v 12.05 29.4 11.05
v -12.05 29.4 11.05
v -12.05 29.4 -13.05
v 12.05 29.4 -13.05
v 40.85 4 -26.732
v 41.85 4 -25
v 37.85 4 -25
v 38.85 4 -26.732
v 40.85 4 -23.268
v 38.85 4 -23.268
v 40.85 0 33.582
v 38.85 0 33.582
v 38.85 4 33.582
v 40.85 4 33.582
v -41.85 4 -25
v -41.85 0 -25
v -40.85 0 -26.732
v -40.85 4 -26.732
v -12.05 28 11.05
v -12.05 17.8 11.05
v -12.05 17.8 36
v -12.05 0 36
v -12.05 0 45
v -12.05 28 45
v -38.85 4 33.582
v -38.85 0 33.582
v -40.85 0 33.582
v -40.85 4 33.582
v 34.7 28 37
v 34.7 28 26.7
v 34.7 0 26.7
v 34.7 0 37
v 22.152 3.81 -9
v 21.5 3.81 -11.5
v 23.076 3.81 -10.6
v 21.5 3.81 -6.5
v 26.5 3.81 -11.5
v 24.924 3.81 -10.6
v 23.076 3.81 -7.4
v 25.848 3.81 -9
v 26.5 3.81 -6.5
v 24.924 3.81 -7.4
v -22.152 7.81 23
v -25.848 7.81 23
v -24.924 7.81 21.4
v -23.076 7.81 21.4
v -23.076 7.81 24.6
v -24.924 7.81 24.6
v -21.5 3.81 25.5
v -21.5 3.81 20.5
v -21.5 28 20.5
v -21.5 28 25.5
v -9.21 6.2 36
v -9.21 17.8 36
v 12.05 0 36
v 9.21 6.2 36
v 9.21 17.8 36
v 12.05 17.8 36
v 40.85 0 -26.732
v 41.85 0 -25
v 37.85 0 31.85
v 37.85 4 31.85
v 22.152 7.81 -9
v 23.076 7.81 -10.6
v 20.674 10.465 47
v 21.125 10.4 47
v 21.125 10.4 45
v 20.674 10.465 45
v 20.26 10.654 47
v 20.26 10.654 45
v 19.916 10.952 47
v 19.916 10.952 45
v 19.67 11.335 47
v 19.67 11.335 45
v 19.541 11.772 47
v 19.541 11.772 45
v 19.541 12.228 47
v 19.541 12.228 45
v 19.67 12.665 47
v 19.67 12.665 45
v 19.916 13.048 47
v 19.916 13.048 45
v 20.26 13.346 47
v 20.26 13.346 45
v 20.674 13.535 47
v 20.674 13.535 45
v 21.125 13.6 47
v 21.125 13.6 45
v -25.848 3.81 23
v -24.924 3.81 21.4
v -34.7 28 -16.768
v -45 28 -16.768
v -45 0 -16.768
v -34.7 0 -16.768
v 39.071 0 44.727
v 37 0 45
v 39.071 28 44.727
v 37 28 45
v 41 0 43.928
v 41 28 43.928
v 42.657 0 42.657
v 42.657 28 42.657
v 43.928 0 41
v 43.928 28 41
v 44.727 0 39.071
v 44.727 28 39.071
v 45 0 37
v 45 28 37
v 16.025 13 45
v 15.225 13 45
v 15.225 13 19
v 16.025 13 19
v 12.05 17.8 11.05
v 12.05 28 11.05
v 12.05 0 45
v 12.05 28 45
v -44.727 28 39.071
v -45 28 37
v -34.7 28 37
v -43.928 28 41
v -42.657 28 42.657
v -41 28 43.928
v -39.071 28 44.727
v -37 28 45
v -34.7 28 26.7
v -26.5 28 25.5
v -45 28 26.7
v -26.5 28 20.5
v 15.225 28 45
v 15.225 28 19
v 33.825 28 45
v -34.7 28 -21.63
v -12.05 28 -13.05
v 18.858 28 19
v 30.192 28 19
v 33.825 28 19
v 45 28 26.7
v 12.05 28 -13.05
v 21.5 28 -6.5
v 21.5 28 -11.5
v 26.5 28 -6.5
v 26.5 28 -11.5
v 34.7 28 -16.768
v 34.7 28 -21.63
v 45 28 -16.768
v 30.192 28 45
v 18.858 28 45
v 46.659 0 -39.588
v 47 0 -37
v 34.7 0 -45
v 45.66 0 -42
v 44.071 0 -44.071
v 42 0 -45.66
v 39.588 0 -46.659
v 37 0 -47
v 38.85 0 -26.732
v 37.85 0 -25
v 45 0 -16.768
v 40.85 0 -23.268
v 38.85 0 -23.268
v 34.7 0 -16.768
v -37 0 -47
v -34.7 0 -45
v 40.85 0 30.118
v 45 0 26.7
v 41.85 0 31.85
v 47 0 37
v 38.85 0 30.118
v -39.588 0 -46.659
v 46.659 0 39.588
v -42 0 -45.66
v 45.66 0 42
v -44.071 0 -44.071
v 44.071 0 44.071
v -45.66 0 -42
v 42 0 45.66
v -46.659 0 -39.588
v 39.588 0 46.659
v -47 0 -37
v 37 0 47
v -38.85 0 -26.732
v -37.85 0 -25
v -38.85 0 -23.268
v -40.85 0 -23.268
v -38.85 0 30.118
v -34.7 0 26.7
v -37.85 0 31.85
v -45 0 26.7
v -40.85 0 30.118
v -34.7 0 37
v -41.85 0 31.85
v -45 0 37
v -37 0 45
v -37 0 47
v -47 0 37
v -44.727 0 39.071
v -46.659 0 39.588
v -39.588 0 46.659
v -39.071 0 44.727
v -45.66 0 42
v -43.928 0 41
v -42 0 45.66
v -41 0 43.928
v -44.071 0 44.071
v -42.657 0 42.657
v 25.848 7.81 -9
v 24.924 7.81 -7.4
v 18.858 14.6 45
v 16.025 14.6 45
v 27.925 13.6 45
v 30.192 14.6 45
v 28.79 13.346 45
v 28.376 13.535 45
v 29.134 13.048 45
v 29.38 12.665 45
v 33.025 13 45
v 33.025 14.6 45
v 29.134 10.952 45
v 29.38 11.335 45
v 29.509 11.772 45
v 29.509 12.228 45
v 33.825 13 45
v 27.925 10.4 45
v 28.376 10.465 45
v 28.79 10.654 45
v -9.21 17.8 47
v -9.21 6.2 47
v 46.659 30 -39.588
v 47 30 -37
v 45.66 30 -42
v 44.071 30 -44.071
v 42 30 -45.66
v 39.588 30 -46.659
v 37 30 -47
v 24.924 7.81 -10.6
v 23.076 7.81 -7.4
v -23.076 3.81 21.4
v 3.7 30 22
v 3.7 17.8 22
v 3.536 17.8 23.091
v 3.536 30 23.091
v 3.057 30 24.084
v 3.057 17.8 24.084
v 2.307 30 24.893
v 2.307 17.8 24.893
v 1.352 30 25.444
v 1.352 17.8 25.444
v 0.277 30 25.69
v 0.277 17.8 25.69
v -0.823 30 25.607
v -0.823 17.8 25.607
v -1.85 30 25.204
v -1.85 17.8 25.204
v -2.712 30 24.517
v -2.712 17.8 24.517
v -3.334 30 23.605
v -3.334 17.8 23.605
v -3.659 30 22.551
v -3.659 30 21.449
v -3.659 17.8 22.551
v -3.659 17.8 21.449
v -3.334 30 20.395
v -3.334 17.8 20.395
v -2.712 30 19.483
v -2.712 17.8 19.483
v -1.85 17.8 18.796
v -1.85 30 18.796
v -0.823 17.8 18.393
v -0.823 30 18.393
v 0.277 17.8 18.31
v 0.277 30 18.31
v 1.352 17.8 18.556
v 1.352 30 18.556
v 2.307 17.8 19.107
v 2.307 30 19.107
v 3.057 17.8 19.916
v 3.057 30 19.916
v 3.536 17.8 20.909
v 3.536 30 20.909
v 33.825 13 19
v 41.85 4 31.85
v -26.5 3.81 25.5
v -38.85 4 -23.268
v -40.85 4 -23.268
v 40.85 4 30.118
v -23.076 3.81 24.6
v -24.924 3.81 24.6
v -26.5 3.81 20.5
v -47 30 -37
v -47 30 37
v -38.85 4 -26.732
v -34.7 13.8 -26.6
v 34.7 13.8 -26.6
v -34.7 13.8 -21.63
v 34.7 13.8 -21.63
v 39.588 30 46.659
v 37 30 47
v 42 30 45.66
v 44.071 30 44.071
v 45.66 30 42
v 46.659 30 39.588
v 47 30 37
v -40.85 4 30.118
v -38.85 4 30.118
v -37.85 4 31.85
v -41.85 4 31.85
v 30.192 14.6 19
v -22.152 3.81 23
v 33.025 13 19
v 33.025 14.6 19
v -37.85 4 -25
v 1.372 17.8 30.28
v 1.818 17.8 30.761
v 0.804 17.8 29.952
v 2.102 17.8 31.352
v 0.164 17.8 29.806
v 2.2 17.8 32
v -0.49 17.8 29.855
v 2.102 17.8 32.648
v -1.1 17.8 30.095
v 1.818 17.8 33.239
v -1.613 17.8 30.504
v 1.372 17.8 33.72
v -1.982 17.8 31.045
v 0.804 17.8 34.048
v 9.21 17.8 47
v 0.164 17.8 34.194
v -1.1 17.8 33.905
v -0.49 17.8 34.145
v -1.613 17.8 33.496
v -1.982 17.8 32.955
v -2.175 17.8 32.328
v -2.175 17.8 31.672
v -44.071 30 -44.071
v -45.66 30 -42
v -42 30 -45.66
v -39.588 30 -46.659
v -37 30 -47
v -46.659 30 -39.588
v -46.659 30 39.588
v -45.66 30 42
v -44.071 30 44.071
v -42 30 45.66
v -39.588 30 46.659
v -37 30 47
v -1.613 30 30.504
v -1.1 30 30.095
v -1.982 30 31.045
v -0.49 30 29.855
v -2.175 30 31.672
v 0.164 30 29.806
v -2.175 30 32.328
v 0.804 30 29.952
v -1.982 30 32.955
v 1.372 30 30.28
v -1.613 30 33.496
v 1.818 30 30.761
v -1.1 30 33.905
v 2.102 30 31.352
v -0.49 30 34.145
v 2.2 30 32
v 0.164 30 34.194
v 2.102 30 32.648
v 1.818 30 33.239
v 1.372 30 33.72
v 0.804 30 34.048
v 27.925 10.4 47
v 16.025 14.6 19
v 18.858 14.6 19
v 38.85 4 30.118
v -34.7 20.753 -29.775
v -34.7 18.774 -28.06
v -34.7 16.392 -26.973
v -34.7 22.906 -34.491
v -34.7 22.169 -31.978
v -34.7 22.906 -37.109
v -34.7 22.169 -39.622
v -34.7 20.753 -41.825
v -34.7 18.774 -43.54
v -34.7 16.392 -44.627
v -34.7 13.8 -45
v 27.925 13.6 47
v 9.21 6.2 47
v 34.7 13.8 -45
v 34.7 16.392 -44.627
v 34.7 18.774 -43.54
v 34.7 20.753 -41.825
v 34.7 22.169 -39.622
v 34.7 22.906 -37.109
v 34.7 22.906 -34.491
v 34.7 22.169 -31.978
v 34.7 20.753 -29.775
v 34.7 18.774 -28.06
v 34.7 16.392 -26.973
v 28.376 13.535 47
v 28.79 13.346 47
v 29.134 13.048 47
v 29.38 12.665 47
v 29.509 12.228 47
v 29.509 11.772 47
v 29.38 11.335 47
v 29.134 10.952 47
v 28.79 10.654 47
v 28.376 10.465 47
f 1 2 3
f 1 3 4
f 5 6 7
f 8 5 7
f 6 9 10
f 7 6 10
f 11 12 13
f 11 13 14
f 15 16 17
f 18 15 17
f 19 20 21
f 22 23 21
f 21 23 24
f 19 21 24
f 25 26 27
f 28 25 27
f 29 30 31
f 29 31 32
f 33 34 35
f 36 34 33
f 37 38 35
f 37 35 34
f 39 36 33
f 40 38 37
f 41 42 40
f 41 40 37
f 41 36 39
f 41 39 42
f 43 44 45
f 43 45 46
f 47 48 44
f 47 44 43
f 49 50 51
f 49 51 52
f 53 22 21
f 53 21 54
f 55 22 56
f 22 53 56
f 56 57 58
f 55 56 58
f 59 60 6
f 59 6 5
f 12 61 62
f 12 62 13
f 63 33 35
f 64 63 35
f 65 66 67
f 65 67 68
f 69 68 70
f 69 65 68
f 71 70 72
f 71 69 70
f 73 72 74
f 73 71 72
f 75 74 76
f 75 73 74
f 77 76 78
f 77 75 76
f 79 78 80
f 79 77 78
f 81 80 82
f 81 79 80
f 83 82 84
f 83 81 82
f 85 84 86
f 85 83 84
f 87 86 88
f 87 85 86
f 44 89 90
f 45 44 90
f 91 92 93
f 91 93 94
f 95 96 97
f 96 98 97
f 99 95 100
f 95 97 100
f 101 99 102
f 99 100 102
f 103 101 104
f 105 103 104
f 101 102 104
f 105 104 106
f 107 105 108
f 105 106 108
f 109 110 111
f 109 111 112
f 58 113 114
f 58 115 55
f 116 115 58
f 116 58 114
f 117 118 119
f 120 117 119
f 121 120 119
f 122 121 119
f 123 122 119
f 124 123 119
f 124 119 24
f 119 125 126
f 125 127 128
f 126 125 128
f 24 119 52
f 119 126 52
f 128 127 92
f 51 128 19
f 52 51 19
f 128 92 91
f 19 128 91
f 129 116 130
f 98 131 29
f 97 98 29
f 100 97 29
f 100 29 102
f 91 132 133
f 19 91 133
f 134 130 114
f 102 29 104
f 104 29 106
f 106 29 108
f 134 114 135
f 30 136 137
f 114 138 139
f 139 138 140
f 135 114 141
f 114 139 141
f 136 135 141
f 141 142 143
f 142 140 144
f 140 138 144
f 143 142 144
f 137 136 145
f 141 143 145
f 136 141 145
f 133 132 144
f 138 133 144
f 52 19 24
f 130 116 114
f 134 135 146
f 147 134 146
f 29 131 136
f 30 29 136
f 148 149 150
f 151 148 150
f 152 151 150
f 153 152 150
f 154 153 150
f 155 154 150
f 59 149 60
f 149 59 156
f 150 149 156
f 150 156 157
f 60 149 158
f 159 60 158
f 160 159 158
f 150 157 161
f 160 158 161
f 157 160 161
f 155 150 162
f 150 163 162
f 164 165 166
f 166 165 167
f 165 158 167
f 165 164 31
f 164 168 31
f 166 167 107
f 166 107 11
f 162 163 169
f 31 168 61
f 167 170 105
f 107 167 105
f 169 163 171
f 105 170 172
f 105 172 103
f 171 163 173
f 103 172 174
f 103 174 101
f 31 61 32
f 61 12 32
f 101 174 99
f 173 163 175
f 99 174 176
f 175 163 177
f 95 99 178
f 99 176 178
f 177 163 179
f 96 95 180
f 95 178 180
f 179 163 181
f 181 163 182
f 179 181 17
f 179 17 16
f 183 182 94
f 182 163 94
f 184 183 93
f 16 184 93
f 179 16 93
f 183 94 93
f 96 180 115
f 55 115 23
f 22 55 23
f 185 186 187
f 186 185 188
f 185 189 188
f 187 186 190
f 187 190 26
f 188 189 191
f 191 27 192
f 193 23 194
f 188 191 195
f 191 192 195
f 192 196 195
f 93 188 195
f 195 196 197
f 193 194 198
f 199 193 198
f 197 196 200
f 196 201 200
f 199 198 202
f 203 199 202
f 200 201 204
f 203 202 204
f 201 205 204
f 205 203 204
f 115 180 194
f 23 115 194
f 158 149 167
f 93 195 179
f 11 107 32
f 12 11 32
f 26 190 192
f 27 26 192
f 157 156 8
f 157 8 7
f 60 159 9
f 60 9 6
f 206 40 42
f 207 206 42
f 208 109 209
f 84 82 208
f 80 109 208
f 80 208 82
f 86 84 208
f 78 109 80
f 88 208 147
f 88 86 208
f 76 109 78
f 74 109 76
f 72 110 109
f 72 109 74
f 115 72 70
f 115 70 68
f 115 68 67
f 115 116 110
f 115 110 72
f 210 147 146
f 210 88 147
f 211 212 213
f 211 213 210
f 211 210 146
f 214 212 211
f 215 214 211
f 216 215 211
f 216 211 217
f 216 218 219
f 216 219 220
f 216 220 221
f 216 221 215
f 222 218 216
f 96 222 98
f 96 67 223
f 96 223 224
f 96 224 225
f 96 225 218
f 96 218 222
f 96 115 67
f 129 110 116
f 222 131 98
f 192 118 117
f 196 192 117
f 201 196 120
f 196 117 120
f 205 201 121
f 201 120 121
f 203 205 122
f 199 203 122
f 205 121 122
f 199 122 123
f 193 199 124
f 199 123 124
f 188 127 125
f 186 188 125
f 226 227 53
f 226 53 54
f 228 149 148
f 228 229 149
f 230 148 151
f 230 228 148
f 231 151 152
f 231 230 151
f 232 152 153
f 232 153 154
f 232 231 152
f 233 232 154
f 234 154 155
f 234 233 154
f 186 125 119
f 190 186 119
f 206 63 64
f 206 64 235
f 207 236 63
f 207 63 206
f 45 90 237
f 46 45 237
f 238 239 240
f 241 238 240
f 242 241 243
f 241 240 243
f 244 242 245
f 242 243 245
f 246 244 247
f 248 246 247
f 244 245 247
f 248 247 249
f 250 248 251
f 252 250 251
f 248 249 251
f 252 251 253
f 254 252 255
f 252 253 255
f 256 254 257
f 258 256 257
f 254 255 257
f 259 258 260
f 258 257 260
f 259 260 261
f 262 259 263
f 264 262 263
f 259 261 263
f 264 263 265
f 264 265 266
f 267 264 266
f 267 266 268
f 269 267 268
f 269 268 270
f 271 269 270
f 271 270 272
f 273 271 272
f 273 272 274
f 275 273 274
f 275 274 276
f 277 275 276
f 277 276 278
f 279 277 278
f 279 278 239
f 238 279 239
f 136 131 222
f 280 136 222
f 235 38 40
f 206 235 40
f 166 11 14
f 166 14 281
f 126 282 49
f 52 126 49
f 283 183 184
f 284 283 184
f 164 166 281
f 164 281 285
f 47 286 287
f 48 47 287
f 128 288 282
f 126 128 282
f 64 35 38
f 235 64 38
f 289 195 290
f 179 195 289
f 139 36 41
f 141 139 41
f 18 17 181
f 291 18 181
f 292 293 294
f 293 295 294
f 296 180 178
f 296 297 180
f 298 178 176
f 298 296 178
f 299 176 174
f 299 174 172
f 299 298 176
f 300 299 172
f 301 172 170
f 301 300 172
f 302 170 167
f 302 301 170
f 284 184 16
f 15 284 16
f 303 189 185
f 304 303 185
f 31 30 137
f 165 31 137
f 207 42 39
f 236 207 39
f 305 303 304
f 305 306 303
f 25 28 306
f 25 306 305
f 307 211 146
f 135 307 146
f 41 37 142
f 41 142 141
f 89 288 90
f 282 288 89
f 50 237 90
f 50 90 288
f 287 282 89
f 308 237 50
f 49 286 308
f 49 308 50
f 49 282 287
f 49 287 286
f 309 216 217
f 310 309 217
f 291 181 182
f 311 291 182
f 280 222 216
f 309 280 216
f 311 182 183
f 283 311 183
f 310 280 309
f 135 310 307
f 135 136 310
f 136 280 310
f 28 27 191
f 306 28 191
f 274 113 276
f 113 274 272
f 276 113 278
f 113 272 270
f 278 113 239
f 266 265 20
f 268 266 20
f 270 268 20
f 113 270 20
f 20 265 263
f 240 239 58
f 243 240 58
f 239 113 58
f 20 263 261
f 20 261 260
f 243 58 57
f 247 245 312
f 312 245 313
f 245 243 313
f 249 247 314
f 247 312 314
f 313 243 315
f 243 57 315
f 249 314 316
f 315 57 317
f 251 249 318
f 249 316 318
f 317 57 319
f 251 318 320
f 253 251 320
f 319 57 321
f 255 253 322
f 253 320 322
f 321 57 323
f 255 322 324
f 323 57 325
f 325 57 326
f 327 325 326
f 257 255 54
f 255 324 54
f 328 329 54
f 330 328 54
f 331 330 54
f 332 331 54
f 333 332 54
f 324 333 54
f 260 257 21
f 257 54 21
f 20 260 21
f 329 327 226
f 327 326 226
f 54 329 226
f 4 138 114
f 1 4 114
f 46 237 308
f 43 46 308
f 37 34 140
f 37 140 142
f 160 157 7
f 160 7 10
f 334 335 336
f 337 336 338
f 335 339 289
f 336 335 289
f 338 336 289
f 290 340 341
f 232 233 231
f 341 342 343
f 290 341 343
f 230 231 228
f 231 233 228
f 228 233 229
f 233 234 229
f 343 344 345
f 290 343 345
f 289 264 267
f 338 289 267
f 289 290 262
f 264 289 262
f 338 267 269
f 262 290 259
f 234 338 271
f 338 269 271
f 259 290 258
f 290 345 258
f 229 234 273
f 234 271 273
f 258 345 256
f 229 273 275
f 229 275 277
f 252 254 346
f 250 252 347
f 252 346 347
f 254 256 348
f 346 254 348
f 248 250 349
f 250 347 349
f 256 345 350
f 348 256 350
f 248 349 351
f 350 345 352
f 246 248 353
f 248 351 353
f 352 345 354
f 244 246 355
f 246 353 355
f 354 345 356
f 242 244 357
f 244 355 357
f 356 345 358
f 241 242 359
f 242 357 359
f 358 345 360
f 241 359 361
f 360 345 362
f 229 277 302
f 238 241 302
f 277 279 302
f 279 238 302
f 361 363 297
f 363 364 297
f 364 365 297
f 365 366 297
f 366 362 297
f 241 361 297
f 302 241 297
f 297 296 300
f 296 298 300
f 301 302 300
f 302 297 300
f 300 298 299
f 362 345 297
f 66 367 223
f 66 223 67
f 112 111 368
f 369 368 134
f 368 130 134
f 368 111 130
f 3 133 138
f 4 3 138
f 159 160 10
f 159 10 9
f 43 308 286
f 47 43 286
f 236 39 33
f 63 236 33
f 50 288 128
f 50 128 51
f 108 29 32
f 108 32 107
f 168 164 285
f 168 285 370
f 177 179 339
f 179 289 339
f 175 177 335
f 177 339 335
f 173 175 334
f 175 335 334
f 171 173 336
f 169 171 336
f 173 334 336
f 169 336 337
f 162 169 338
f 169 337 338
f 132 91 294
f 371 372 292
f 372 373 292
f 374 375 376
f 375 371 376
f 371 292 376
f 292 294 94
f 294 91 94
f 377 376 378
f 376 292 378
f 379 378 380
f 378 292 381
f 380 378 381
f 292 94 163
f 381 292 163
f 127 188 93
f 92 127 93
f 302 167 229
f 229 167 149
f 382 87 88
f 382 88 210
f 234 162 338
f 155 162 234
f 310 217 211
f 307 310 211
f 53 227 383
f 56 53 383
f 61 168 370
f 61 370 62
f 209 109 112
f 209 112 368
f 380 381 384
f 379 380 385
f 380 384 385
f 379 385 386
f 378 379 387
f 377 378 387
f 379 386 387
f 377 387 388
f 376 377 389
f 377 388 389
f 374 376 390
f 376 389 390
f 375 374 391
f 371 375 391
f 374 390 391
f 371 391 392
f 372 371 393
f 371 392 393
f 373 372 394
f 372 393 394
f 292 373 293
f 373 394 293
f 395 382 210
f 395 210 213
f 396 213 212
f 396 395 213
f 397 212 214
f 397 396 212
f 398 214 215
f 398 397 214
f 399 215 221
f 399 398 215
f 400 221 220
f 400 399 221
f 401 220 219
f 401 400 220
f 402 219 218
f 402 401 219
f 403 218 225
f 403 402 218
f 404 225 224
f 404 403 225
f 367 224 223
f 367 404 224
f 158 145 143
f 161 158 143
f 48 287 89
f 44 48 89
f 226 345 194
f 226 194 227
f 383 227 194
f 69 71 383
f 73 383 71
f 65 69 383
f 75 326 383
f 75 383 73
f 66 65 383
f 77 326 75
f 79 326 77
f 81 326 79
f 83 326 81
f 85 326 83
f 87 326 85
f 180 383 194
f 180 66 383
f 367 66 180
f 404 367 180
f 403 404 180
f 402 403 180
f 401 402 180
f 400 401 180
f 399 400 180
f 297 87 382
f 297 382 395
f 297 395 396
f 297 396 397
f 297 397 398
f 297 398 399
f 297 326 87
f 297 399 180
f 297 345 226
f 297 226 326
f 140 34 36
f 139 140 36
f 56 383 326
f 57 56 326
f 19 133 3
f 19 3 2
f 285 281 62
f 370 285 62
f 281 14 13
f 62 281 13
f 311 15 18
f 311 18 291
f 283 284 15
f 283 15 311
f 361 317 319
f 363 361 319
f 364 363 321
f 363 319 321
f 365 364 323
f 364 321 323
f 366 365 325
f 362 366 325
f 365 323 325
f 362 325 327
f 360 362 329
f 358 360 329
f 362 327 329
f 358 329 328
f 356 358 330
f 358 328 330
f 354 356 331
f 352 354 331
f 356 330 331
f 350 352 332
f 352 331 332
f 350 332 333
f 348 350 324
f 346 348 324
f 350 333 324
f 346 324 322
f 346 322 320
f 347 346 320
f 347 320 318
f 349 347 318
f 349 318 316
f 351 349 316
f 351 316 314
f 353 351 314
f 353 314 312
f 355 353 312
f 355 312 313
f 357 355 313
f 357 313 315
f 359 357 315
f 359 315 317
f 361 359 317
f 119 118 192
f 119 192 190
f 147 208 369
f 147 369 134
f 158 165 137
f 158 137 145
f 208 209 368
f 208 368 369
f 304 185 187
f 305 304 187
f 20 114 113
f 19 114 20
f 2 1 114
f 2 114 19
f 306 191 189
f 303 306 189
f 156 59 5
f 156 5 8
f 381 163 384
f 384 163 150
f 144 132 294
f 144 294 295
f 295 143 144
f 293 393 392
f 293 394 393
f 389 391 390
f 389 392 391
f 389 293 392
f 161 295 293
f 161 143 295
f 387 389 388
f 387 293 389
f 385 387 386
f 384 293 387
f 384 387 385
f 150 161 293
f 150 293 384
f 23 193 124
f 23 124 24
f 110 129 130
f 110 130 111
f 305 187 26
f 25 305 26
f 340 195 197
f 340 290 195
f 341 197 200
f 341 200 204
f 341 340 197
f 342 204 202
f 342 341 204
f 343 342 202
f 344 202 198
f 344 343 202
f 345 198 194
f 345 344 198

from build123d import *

# Parameters (mm, degrees)
SKETCH_1_W             = 94
SKETCH_1_H             = 94
EXTRUDE_1_DEPTH        = 30
FILLET_1_R             = 10
SHELL_1_T              = -2
SKETCH_2_W             = 24.1
SKETCH_2_H             = 30
EXTRUDE_3392_DEPTH     = 11
CUT_EXTRUDE_3513_REACH = 111.293
SKETCH_3_W             = 18.42
SKETCH_3_H             = 11.6
SKETCH_4_W             = 24.1
SKETCH_4_H             = 24.1
CUT_EXTRUDE_3826_DEPTH = 1.4
EXTRUDE_4548_DEPTH     = 14.2
SKETCH_9_W             = 69.4
SKETCH_9_H             = 9.2
SKETCH_10_W            = 5
SKETCH_10_H            = 5
EXTRUDE_5202_DEPTH     = 24.19
CUT_EXTRUDE_5310_DEPTH = 4
USBC_REACH             = 111.293
USBC_2_DEPTH           = 26
SKETCH_22_W            = 24.1
SKETCH_22_H            = 10.2
EXTRUDE_7617_DEPTH     = 24.95
CUT_EXTRUDE_6_REACH    = 70.81
SKETCH_23_R            = 2.2
SKETCH_23_R_2          = 3.7
SKETCH_13_W            = 10.3
SKETCH_13_H            = 10.3
EXTRUDE_4_DEPTH        = 28
CUT_EXTRUDE_7_DEPTH    = 4


with BuildPart() as part:
    # 草图1 → 凸台-拉伸1 (new body)
    with BuildSketch(Plane(origin=(0, 0, 0), x_dir=(1, 0, 0), z_dir=(0, 1, 0))):
        Rectangle(SKETCH_1_W, SKETCH_1_H)
    extrude(amount=EXTRUDE_1_DEPTH)

    # 圆角1
    fillet_1_edges = [part.edges().sort_by_distance(p)[0] for p in [
        (-47, 15, -47),
        (47, 15, -47),
        (47, 15, 47),
        (-47, 15, 47),
    ]]
    fillet(fillet_1_edges, radius=FILLET_1_R)

    # 抽壳1
    shell_1_openings = [part.faces().sort_by_distance(p)[0] for p in [
        (0, 0, 0),
    ]]
    offset(amount=SHELL_1_T, openings=shell_1_openings, kind=Kind.INTERSECTION)

    # 草图2 → Extrude 3392 (add)
    with BuildSketch(Plane.XY.offset(47)):
        with Locations((0, 15)):
            Rectangle(SKETCH_2_W, SKETCH_2_H)
    extrude(amount=-EXTRUDE_3392_DEPTH)

    # 草图3 → Cut-Extrude 3513 (cut, up to next)
    with BuildSketch(Plane.XY.offset(47), mode=Mode.PRIVATE) as cut_extrude_3513_sk1:
        with Locations((0, 12)):
            Rectangle(SKETCH_3_W, SKETCH_3_H)
    cut_extrude_3513_tool1 = extrude(cut_extrude_3513_sk1.sketch, amount=-CUT_EXTRUDE_3513_REACH, mode=Mode.PRIVATE) & part.part
    add(cut_extrude_3513_tool1.solids().sort_by_distance((0, 12, 47))[0], mode=Mode.SUBTRACT)

    # 草图4 → Cut-Extrude 3826 (cut)
    with BuildSketch(Plane.XZ.offset(-28)):
        with Locations((0, -1)):
            Rectangle(SKETCH_4_W, SKETCH_4_H)
    extrude(amount=-CUT_EXTRUDE_3826_DEPTH, mode=Mode.SUBTRACT)

    # 草图6 → Extrude 4548 (add)
    with BuildSketch(Plane.XZ.offset(-28)):
        with BuildLine():
            Line((-45, -37), (-45, -21.630094022))
            Line((-45, -21.630094022), (45, -21.630094022))
            Line((45, -21.630094022), (45, -37))
            ThreePointArc((45, -37), (42.656854249, -42.656854249), (37, -45))
            Line((37, -45), (-37, -45))
            ThreePointArc((-37, -45), (-42.656854249, -42.656854249), (-45, -37))
        make_face()
    extrude(amount=EXTRUDE_4548_DEPTH)

    # 草图9 → Cut-Revolve 4776 (revolve, cut)
    with BuildSketch(Plane.XZ.offset(-13.8)):
        with Locations((0, -31.2)):
            Rectangle(SKETCH_9_W, SKETCH_9_H)
    revolve(axis=Axis((-34.7, 13.8, -35.8), (1, 0, 0)), mode=Mode.SUBTRACT)

    # 草图10 → Extrude 5202 (add)
    with BuildSketch(Plane.XZ.offset(-28)):
        with Locations((-24, 23)):
            Rectangle(SKETCH_10_W, SKETCH_10_H)
        with Locations((24, -9)):
            Rectangle(SKETCH_10_W, SKETCH_10_H)
    extrude(amount=EXTRUDE_5202_DEPTH)

    # 草图11 → Cut-Extrude 5310 (cut)
    with BuildSketch(Plane.XZ.offset(-3.81)):
        Polygon((-23.076239569, 21.4), (-22.152479139, 23), (-23.076239569, 24.6), (-24.923760431, 24.6), (-25.847520861, 23), (-24.923760431, 21.4), align=None)
        Polygon((24.923760431, -10.6), (25.847520861, -9), (24.923760431, -7.4), (23.076239569, -7.4), (22.152479139, -9), (23.076239569, -10.6), align=None)
    extrude(amount=-CUT_EXTRUDE_5310_DEPTH, mode=Mode.SUBTRACT)

    # 草图15 → USBC (cut, up to next)
    with BuildSketch(Plane.XY.offset(47), mode=Mode.PRIVATE) as usbc_sk1:
        with BuildLine():
            Line((21.125, 13.6), (27.925, 13.6))
            ThreePointArc((27.925, 13.6), (29.525, 12), (27.925, 10.4))
            Line((27.925, 10.4), (21.125, 10.4))
            ThreePointArc((21.125, 10.4), (19.525, 12), (21.125, 13.6))
        make_face()
    usbc_tool1 = extrude(usbc_sk1.sketch, amount=-USBC_REACH, mode=Mode.PRIVATE) & part.part
    add(usbc_tool1.solids().sort_by_distance((24.525, 12, 47))[0], mode=Mode.SUBTRACT)

    # 草图16 → USBC 2 (add)
    with BuildSketch(Plane(origin=(0, 0, 45), x_dir=(-1, 0, 0), z_dir=(0, 0, -1))):
        Polygon((-15.225, 13), (-16.025, 13), (-16.025, 14.6), (-18.858333333, 14.6), (-18.858333333, 28), (-15.225, 28), align=None)
        Polygon((-30.191666667, 28), (-33.825, 28), (-33.825, 13), (-33.025, 13), (-33.025, 14.6), (-30.191666667, 14.6), align=None)
    extrude(amount=USBC_2_DEPTH)

    # 草图22 → Extrude 7617 (add)
    with BuildSketch(Plane(origin=(0, 0, 36), x_dir=(-1, 0, 0), z_dir=(0, 0, -1))):
        with Locations((0, 22.9)):
            Rectangle(SKETCH_22_W, SKETCH_22_H)
    extrude(amount=EXTRUDE_7617_DEPTH)

    # 草图23 → 切除-拉伸6 (cut, up to next)
    with BuildSketch(Plane(origin=(0, 17.8, 0), x_dir=(-1, 0, 0), z_dir=(0, -1, 0)), mode=Mode.PRIVATE) as cut_extrude_6_sk1:
        with Locations(Location((0, -32, 0), (0, 0, 180))):
            Circle(SKETCH_23_R)
    cut_extrude_6_tool1 = extrude(cut_extrude_6_sk1.sketch, amount=-CUT_EXTRUDE_6_REACH, mode=Mode.PRIVATE) & part.part
    # 草图23 → 切除-拉伸6 (cut, up to next)
    with BuildSketch(Plane(origin=(0, 17.8, 0), x_dir=(-1, 0, 0), z_dir=(0, -1, 0)), mode=Mode.PRIVATE) as cut_extrude_6_sk2:
        with Locations(Location((0, -22, 0), (0, 0, 180))):
            Circle(SKETCH_23_R_2)
    cut_extrude_6_tool2 = extrude(cut_extrude_6_sk2.sketch, amount=-CUT_EXTRUDE_6_REACH, mode=Mode.PRIVATE) & part.part
    add(cut_extrude_6_tool1.solids().sort_by_distance((0, 17.8, 32))[0], mode=Mode.SUBTRACT)
    add(cut_extrude_6_tool2.solids().sort_by_distance((0, 17.8, 22))[0], mode=Mode.SUBTRACT)

    # 草图13 → 凸台-拉伸4 (add)
    with BuildSketch(Plane.XZ.offset(-28)):
        with BuildLine():
            Line((-45, -37), (-45, -16.768109074))
            Line((-45, -16.768109074), (-34.7, -16.768109074))
            Line((-34.7, -16.768109074), (-34.7, -45))
            Line((-34.7, -45), (-37, -45))
            ThreePointArc((-37, -45), (-42.656854249, -42.656854249), (-45, -37))
        make_face()
        with BuildLine():
            Line((34.7, -16.768109074), (34.7, -45))
            Line((34.7, -45), (37, -45))
            ThreePointArc((37, -45), (42.656854249, -42.656854249), (45, -37))
            Line((45, -37), (45, -16.768109074))
            Line((45, -16.768109074), (34.7, -16.768109074))
        make_face()
        with Locations((-39.85, 31.85)):
            Rectangle(SKETCH_13_W, SKETCH_13_H)
        with Locations((39.85, 31.85)):
            Rectangle(SKETCH_13_W, SKETCH_13_H)
    extrude(amount=EXTRUDE_4_DEPTH)

    # 草图26 → 切除-拉伸7 (cut)
    with BuildSketch(Plane.XZ):
        Polygon((-40.85, 30.117949192), (-38.85, 30.117949192), (-37.85, 31.85), (-38.85, 33.582050808), (-40.85, 33.582050808), (-41.85, 31.85), align=None)
        Polygon((40.85, 33.582050808), (41.85, 31.85), (40.85, 30.117949192), (38.85, 30.117949192), (37.85, 31.85), (38.85, 33.582050808), align=None)
        Polygon((40.85, -23.267949192), (41.85, -25), (40.85, -26.732050808), (38.85, -26.732050808), (37.85, -25), (38.85, -23.267949192), align=None)
        Polygon((-40.85, -23.267949192), (-41.85, -25), (-40.85, -26.732050808), (-38.85, -26.732050808), (-37.85, -25), (-38.85, -23.267949192), align=None)
    extrude(amount=-CUT_EXTRUDE_7_DEPTH, mode=Mode.SUBTRACT)


solid = part.part
